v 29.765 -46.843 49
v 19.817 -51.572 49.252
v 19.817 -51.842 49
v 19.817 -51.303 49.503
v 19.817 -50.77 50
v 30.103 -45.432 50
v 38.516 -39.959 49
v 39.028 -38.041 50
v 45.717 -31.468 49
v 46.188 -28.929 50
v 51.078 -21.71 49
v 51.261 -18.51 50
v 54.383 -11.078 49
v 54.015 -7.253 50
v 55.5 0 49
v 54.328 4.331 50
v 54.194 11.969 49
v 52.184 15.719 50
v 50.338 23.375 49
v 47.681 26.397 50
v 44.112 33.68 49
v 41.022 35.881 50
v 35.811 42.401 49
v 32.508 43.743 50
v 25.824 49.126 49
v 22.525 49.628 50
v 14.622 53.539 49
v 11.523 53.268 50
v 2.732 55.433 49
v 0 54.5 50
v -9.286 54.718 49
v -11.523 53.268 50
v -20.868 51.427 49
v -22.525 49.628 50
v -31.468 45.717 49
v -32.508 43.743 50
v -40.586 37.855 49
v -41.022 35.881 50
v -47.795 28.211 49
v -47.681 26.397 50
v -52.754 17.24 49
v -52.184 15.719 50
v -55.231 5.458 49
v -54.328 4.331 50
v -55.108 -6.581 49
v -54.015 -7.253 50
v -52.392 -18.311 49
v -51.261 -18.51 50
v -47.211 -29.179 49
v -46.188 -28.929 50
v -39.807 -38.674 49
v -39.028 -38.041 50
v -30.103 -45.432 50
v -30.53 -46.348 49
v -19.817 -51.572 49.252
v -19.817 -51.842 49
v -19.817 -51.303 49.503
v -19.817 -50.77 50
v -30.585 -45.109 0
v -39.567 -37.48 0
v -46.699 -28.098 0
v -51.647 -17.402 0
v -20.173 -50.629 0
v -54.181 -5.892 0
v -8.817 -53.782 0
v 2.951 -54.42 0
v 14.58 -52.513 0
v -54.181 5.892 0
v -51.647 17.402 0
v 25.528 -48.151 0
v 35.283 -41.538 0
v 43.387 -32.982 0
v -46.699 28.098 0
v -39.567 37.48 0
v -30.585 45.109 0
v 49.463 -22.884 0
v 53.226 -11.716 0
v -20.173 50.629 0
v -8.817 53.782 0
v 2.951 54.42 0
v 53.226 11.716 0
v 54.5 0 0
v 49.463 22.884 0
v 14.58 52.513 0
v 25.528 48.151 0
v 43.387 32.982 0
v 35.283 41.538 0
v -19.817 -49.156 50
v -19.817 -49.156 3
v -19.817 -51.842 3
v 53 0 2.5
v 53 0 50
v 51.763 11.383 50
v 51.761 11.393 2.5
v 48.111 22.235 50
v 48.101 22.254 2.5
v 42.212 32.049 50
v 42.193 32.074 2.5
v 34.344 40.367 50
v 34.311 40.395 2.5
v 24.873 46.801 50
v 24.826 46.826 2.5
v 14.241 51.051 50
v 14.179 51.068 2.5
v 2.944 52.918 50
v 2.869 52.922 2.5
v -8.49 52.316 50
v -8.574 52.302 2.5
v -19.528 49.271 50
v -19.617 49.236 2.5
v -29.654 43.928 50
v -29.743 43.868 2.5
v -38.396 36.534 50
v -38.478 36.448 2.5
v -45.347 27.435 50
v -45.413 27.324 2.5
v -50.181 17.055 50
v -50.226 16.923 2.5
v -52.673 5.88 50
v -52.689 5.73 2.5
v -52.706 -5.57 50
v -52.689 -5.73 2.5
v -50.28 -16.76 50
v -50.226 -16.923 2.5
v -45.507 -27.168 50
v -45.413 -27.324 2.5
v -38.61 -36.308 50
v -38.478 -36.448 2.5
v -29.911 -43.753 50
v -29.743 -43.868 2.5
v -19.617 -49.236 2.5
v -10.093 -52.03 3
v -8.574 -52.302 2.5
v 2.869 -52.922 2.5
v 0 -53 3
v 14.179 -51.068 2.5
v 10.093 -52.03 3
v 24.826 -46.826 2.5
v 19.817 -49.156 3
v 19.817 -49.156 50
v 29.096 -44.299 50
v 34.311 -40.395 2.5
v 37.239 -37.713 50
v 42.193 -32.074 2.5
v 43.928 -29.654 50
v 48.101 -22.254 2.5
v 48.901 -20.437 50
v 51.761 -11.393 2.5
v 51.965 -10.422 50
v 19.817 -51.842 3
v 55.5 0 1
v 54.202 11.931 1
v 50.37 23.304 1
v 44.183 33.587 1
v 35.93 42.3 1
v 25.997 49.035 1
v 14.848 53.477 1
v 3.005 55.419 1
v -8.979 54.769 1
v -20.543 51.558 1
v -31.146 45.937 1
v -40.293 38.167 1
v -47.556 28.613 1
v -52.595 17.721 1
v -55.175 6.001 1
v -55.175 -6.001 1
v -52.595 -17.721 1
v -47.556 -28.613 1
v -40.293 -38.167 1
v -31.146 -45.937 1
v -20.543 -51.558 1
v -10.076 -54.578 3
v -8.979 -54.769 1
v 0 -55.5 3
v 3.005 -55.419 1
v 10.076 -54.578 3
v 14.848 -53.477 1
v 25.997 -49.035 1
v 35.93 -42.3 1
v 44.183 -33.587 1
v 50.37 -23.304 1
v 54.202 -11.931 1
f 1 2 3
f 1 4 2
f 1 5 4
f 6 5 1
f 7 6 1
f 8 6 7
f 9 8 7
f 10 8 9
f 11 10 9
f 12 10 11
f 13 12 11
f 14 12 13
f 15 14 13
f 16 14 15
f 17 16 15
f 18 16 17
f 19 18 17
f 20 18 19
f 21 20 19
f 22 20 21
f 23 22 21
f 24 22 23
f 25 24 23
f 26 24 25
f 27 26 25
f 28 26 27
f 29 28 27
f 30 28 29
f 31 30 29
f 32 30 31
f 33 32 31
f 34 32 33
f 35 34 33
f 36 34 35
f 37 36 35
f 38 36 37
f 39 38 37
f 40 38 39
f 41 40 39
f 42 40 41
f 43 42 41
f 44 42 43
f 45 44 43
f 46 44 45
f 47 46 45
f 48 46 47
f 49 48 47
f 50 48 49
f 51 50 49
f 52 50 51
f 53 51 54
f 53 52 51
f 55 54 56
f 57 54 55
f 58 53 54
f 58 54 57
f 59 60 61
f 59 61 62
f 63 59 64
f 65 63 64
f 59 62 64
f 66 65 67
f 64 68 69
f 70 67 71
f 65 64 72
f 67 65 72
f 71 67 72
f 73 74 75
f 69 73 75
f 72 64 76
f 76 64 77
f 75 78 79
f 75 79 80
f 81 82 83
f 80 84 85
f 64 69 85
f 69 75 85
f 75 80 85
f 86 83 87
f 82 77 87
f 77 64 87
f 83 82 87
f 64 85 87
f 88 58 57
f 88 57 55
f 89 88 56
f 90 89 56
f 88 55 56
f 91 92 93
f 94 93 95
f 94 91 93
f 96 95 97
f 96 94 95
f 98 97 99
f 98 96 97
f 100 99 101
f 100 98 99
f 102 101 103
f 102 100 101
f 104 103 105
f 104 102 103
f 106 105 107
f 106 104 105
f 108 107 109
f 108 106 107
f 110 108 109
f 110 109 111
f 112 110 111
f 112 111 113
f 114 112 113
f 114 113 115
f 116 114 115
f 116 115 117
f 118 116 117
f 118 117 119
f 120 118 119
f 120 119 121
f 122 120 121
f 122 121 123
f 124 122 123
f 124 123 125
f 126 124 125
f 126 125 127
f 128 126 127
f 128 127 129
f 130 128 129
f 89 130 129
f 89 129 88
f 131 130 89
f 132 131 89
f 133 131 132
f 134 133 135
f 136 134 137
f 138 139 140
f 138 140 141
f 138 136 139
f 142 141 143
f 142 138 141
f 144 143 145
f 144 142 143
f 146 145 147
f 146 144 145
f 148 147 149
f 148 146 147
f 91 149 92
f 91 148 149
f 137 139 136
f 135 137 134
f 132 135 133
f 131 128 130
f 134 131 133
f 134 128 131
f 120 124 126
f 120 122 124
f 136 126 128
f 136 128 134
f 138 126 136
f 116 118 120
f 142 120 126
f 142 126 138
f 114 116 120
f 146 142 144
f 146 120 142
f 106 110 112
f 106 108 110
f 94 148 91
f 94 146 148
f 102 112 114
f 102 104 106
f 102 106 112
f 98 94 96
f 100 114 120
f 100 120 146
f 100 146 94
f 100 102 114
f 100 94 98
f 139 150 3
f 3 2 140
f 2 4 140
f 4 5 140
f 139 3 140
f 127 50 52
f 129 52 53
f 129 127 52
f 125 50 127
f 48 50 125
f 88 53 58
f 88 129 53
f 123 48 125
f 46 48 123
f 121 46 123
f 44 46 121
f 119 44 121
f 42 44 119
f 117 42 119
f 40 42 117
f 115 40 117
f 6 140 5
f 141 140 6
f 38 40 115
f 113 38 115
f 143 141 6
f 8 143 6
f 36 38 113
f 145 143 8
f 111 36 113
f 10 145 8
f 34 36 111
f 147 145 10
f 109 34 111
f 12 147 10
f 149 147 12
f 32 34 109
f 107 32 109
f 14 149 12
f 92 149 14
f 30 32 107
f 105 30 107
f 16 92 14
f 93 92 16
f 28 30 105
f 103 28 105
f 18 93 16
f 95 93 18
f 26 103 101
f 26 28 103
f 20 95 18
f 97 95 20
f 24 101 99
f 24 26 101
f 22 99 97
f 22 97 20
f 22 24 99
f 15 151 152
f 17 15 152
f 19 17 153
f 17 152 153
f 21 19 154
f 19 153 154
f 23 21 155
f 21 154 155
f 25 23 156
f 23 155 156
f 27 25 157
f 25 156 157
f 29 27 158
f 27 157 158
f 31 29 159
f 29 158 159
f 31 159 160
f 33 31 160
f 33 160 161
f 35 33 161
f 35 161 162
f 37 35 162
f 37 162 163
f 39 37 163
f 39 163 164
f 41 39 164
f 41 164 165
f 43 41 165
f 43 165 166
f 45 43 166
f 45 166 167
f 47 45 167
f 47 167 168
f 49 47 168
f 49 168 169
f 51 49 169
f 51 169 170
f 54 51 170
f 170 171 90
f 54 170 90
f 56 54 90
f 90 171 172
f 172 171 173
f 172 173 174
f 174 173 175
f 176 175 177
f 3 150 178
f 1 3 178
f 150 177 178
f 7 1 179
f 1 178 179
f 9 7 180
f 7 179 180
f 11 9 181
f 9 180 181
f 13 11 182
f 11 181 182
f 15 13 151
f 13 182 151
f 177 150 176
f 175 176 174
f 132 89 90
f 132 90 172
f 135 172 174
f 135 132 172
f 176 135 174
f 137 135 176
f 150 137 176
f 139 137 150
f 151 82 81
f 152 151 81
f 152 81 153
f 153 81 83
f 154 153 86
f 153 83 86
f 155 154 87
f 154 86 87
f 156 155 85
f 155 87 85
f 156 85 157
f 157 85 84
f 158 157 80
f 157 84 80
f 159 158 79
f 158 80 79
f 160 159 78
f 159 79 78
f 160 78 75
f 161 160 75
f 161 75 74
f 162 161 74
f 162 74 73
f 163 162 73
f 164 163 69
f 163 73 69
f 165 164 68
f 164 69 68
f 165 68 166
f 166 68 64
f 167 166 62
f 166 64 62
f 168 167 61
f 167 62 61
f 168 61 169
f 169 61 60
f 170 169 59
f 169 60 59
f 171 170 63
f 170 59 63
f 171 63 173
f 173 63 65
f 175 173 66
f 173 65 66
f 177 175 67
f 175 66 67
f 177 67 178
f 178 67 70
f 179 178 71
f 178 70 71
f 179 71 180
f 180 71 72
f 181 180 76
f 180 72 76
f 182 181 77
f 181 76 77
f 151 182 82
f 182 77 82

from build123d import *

# Parameters (mm, degrees)
F0_R     = 55.5
F1_DEPTH = 50
F2_T     = -2.5
F4_DEPTH = 47
F5_SIZE  = 1


with BuildPart() as f1:
    # F0 (on Top) → F1 (new body)
    with BuildSketch(Plane.XY):
        Circle(F0_R)
    extrude(amount=F1_DEPTH)

    # F2
    f2_openings = [f1.faces().sort_by_distance(p)[0] for p in [
        (0, 0, 50),
    ]]
    offset(amount=F2_T, openings=f2_openings)

    # F3 (on face) → F4 (cut)
    with BuildSketch(Plane.XY.offset(50)):
        with BuildLine():
            ThreePointArc((19.8165141046, -51.841641262), (0, -55.5), (-19.8165141046, -51.841641262))
            Line((-19.8165141046, -51.841641262), (-19.8165141046, -57.2821125388))
            Line((-19.8165141046, -57.2821125388), (0, -57.2821125388))
            Line((0, -57.2821125388), (19.8165141046, -57.2821125388))
            Line((19.8165141046, -57.2821125388), (19.8165141046, -51.841641262))
        make_face()
        with BuildLine():
            ThreePointArc((19.8165141046, -49.1559331998), (0, -53), (-19.8165141046, -49.1559331998))
            Line((-19.8165141046, -49.1559331998), (-19.8165141046, -51.841641262))
            ThreePointArc((-19.8165141046, -51.841641262), (0, -55.5), (19.8165141046, -51.841641262))
            Line((19.8165141046, -51.841641262), (19.8165141046, -49.1559331998))
        make_face()
    extrude(amount=-F4_DEPTH, mode=Mode.SUBTRACT)

    # F5
    f5_edges = [f1.edges().sort_by_distance(p)[0] for p in [
        (-55.5, 0, 0),
        (-31.467709, 45.716882, 50),
    ]]
    chamfer(f5_edges, length=F5_SIZE)


solid = f1.part
